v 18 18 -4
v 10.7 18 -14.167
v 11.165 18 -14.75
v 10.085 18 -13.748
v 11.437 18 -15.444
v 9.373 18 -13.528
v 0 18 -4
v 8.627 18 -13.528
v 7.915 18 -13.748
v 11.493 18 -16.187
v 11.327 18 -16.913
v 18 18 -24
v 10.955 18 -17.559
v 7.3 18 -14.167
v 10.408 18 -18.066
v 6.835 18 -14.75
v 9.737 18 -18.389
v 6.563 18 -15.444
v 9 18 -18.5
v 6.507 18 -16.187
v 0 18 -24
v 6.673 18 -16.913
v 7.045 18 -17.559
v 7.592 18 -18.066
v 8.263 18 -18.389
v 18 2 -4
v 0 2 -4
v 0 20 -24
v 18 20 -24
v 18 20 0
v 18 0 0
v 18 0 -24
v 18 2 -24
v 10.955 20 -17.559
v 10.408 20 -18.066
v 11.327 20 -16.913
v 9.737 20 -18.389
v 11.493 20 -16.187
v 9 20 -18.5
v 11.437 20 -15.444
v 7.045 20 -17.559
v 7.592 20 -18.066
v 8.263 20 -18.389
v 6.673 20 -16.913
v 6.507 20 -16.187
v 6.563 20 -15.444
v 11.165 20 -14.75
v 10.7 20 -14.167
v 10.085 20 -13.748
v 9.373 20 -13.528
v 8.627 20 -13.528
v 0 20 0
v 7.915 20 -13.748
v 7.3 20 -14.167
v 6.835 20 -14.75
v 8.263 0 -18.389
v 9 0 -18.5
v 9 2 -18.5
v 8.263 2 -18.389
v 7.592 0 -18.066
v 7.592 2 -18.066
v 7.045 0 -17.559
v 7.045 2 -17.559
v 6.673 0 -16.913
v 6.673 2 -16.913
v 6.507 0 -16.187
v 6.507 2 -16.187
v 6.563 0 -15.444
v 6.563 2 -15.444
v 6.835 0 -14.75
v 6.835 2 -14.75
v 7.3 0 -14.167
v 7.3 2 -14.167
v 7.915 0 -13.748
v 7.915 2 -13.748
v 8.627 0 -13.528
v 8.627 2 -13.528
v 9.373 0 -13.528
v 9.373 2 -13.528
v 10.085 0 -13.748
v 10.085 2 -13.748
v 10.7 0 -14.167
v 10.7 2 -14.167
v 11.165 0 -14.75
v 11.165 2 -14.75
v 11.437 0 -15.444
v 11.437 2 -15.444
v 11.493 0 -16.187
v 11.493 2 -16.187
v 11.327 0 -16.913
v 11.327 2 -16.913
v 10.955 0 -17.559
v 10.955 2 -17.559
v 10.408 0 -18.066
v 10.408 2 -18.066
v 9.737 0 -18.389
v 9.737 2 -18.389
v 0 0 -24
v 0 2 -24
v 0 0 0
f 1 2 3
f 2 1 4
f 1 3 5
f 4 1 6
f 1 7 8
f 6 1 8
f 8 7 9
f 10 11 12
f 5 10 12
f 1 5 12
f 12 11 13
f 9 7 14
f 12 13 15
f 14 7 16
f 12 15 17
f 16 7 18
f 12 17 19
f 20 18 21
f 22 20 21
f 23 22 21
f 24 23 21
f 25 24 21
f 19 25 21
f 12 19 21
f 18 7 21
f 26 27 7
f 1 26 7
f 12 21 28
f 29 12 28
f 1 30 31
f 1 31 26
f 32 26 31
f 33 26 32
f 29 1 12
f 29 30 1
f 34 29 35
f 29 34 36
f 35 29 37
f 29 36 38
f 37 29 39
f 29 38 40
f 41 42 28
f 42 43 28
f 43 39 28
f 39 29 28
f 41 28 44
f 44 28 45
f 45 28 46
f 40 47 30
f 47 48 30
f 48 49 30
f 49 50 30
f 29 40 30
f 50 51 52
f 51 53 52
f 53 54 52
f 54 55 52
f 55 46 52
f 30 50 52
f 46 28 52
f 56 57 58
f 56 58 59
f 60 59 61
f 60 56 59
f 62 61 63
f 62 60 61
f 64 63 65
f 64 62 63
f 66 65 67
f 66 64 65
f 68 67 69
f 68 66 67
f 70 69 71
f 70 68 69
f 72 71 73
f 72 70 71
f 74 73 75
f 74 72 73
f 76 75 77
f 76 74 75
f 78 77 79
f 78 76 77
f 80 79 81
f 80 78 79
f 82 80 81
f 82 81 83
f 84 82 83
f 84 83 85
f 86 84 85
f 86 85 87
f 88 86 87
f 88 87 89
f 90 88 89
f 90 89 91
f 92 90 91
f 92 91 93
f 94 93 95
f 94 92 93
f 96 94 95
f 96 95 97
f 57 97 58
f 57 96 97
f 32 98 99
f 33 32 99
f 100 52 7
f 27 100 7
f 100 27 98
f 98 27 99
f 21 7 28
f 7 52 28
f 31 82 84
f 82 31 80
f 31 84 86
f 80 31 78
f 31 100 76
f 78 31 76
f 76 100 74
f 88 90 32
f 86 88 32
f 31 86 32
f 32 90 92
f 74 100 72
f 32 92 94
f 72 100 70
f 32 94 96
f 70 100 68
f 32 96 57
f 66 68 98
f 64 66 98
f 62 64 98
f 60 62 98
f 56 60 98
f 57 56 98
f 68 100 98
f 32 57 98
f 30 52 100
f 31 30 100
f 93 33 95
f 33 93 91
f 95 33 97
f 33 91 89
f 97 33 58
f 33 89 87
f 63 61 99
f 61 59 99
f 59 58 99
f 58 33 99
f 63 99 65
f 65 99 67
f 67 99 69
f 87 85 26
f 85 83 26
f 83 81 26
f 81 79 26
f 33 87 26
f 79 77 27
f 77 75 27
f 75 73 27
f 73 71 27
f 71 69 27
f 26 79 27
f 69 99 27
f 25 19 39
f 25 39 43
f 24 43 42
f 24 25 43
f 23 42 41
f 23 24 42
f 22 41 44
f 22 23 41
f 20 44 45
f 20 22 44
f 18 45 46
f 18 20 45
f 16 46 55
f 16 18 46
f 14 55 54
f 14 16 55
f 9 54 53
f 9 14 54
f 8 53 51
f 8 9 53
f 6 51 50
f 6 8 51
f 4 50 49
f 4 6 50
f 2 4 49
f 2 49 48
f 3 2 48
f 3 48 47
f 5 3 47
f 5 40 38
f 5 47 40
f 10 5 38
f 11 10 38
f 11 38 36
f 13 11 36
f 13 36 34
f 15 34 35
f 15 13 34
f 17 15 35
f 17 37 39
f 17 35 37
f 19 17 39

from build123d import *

# Parameters (mm, degrees)
EXTRUDE_1_DEPTH          = 18
CUT_EXTRUDE_1_DEPTH      = 37
CUT_EXTRUDE_1_DEPTH_BACK = 18
SKETCH_2_R               = 2.5


with BuildPart() as part:
    # 草图1 → 凸台-拉伸1 (new body)
    with BuildSketch(Plane(origin=(0, 0, 0), x_dir=(0, 0, -1), z_dir=(1, 0, 0))):
        Polygon((0, 20), (0, 0), (24, 0), (24, 2), (4, 2), (4, 18), (24, 18), (24, 20), align=None)
    extrude(amount=EXTRUDE_1_DEPTH)

    # 草图2 → 切除-拉伸1 (cut, two sides: drawn at the far end of the back side and taken through both)
    with BuildSketch(Plane(origin=(0, 2, 0), x_dir=(1, 0, 0), z_dir=(0, 1, 0)).offset(-CUT_EXTRUDE_1_DEPTH_BACK)):
        with Locations(Location((9, 16, 0), (0, 0, 90))):
            Circle(SKETCH_2_R)
    extrude(amount=CUT_EXTRUDE_1_DEPTH + CUT_EXTRUDE_1_DEPTH_BACK, mode=Mode.SUBTRACT)


solid = part.part
